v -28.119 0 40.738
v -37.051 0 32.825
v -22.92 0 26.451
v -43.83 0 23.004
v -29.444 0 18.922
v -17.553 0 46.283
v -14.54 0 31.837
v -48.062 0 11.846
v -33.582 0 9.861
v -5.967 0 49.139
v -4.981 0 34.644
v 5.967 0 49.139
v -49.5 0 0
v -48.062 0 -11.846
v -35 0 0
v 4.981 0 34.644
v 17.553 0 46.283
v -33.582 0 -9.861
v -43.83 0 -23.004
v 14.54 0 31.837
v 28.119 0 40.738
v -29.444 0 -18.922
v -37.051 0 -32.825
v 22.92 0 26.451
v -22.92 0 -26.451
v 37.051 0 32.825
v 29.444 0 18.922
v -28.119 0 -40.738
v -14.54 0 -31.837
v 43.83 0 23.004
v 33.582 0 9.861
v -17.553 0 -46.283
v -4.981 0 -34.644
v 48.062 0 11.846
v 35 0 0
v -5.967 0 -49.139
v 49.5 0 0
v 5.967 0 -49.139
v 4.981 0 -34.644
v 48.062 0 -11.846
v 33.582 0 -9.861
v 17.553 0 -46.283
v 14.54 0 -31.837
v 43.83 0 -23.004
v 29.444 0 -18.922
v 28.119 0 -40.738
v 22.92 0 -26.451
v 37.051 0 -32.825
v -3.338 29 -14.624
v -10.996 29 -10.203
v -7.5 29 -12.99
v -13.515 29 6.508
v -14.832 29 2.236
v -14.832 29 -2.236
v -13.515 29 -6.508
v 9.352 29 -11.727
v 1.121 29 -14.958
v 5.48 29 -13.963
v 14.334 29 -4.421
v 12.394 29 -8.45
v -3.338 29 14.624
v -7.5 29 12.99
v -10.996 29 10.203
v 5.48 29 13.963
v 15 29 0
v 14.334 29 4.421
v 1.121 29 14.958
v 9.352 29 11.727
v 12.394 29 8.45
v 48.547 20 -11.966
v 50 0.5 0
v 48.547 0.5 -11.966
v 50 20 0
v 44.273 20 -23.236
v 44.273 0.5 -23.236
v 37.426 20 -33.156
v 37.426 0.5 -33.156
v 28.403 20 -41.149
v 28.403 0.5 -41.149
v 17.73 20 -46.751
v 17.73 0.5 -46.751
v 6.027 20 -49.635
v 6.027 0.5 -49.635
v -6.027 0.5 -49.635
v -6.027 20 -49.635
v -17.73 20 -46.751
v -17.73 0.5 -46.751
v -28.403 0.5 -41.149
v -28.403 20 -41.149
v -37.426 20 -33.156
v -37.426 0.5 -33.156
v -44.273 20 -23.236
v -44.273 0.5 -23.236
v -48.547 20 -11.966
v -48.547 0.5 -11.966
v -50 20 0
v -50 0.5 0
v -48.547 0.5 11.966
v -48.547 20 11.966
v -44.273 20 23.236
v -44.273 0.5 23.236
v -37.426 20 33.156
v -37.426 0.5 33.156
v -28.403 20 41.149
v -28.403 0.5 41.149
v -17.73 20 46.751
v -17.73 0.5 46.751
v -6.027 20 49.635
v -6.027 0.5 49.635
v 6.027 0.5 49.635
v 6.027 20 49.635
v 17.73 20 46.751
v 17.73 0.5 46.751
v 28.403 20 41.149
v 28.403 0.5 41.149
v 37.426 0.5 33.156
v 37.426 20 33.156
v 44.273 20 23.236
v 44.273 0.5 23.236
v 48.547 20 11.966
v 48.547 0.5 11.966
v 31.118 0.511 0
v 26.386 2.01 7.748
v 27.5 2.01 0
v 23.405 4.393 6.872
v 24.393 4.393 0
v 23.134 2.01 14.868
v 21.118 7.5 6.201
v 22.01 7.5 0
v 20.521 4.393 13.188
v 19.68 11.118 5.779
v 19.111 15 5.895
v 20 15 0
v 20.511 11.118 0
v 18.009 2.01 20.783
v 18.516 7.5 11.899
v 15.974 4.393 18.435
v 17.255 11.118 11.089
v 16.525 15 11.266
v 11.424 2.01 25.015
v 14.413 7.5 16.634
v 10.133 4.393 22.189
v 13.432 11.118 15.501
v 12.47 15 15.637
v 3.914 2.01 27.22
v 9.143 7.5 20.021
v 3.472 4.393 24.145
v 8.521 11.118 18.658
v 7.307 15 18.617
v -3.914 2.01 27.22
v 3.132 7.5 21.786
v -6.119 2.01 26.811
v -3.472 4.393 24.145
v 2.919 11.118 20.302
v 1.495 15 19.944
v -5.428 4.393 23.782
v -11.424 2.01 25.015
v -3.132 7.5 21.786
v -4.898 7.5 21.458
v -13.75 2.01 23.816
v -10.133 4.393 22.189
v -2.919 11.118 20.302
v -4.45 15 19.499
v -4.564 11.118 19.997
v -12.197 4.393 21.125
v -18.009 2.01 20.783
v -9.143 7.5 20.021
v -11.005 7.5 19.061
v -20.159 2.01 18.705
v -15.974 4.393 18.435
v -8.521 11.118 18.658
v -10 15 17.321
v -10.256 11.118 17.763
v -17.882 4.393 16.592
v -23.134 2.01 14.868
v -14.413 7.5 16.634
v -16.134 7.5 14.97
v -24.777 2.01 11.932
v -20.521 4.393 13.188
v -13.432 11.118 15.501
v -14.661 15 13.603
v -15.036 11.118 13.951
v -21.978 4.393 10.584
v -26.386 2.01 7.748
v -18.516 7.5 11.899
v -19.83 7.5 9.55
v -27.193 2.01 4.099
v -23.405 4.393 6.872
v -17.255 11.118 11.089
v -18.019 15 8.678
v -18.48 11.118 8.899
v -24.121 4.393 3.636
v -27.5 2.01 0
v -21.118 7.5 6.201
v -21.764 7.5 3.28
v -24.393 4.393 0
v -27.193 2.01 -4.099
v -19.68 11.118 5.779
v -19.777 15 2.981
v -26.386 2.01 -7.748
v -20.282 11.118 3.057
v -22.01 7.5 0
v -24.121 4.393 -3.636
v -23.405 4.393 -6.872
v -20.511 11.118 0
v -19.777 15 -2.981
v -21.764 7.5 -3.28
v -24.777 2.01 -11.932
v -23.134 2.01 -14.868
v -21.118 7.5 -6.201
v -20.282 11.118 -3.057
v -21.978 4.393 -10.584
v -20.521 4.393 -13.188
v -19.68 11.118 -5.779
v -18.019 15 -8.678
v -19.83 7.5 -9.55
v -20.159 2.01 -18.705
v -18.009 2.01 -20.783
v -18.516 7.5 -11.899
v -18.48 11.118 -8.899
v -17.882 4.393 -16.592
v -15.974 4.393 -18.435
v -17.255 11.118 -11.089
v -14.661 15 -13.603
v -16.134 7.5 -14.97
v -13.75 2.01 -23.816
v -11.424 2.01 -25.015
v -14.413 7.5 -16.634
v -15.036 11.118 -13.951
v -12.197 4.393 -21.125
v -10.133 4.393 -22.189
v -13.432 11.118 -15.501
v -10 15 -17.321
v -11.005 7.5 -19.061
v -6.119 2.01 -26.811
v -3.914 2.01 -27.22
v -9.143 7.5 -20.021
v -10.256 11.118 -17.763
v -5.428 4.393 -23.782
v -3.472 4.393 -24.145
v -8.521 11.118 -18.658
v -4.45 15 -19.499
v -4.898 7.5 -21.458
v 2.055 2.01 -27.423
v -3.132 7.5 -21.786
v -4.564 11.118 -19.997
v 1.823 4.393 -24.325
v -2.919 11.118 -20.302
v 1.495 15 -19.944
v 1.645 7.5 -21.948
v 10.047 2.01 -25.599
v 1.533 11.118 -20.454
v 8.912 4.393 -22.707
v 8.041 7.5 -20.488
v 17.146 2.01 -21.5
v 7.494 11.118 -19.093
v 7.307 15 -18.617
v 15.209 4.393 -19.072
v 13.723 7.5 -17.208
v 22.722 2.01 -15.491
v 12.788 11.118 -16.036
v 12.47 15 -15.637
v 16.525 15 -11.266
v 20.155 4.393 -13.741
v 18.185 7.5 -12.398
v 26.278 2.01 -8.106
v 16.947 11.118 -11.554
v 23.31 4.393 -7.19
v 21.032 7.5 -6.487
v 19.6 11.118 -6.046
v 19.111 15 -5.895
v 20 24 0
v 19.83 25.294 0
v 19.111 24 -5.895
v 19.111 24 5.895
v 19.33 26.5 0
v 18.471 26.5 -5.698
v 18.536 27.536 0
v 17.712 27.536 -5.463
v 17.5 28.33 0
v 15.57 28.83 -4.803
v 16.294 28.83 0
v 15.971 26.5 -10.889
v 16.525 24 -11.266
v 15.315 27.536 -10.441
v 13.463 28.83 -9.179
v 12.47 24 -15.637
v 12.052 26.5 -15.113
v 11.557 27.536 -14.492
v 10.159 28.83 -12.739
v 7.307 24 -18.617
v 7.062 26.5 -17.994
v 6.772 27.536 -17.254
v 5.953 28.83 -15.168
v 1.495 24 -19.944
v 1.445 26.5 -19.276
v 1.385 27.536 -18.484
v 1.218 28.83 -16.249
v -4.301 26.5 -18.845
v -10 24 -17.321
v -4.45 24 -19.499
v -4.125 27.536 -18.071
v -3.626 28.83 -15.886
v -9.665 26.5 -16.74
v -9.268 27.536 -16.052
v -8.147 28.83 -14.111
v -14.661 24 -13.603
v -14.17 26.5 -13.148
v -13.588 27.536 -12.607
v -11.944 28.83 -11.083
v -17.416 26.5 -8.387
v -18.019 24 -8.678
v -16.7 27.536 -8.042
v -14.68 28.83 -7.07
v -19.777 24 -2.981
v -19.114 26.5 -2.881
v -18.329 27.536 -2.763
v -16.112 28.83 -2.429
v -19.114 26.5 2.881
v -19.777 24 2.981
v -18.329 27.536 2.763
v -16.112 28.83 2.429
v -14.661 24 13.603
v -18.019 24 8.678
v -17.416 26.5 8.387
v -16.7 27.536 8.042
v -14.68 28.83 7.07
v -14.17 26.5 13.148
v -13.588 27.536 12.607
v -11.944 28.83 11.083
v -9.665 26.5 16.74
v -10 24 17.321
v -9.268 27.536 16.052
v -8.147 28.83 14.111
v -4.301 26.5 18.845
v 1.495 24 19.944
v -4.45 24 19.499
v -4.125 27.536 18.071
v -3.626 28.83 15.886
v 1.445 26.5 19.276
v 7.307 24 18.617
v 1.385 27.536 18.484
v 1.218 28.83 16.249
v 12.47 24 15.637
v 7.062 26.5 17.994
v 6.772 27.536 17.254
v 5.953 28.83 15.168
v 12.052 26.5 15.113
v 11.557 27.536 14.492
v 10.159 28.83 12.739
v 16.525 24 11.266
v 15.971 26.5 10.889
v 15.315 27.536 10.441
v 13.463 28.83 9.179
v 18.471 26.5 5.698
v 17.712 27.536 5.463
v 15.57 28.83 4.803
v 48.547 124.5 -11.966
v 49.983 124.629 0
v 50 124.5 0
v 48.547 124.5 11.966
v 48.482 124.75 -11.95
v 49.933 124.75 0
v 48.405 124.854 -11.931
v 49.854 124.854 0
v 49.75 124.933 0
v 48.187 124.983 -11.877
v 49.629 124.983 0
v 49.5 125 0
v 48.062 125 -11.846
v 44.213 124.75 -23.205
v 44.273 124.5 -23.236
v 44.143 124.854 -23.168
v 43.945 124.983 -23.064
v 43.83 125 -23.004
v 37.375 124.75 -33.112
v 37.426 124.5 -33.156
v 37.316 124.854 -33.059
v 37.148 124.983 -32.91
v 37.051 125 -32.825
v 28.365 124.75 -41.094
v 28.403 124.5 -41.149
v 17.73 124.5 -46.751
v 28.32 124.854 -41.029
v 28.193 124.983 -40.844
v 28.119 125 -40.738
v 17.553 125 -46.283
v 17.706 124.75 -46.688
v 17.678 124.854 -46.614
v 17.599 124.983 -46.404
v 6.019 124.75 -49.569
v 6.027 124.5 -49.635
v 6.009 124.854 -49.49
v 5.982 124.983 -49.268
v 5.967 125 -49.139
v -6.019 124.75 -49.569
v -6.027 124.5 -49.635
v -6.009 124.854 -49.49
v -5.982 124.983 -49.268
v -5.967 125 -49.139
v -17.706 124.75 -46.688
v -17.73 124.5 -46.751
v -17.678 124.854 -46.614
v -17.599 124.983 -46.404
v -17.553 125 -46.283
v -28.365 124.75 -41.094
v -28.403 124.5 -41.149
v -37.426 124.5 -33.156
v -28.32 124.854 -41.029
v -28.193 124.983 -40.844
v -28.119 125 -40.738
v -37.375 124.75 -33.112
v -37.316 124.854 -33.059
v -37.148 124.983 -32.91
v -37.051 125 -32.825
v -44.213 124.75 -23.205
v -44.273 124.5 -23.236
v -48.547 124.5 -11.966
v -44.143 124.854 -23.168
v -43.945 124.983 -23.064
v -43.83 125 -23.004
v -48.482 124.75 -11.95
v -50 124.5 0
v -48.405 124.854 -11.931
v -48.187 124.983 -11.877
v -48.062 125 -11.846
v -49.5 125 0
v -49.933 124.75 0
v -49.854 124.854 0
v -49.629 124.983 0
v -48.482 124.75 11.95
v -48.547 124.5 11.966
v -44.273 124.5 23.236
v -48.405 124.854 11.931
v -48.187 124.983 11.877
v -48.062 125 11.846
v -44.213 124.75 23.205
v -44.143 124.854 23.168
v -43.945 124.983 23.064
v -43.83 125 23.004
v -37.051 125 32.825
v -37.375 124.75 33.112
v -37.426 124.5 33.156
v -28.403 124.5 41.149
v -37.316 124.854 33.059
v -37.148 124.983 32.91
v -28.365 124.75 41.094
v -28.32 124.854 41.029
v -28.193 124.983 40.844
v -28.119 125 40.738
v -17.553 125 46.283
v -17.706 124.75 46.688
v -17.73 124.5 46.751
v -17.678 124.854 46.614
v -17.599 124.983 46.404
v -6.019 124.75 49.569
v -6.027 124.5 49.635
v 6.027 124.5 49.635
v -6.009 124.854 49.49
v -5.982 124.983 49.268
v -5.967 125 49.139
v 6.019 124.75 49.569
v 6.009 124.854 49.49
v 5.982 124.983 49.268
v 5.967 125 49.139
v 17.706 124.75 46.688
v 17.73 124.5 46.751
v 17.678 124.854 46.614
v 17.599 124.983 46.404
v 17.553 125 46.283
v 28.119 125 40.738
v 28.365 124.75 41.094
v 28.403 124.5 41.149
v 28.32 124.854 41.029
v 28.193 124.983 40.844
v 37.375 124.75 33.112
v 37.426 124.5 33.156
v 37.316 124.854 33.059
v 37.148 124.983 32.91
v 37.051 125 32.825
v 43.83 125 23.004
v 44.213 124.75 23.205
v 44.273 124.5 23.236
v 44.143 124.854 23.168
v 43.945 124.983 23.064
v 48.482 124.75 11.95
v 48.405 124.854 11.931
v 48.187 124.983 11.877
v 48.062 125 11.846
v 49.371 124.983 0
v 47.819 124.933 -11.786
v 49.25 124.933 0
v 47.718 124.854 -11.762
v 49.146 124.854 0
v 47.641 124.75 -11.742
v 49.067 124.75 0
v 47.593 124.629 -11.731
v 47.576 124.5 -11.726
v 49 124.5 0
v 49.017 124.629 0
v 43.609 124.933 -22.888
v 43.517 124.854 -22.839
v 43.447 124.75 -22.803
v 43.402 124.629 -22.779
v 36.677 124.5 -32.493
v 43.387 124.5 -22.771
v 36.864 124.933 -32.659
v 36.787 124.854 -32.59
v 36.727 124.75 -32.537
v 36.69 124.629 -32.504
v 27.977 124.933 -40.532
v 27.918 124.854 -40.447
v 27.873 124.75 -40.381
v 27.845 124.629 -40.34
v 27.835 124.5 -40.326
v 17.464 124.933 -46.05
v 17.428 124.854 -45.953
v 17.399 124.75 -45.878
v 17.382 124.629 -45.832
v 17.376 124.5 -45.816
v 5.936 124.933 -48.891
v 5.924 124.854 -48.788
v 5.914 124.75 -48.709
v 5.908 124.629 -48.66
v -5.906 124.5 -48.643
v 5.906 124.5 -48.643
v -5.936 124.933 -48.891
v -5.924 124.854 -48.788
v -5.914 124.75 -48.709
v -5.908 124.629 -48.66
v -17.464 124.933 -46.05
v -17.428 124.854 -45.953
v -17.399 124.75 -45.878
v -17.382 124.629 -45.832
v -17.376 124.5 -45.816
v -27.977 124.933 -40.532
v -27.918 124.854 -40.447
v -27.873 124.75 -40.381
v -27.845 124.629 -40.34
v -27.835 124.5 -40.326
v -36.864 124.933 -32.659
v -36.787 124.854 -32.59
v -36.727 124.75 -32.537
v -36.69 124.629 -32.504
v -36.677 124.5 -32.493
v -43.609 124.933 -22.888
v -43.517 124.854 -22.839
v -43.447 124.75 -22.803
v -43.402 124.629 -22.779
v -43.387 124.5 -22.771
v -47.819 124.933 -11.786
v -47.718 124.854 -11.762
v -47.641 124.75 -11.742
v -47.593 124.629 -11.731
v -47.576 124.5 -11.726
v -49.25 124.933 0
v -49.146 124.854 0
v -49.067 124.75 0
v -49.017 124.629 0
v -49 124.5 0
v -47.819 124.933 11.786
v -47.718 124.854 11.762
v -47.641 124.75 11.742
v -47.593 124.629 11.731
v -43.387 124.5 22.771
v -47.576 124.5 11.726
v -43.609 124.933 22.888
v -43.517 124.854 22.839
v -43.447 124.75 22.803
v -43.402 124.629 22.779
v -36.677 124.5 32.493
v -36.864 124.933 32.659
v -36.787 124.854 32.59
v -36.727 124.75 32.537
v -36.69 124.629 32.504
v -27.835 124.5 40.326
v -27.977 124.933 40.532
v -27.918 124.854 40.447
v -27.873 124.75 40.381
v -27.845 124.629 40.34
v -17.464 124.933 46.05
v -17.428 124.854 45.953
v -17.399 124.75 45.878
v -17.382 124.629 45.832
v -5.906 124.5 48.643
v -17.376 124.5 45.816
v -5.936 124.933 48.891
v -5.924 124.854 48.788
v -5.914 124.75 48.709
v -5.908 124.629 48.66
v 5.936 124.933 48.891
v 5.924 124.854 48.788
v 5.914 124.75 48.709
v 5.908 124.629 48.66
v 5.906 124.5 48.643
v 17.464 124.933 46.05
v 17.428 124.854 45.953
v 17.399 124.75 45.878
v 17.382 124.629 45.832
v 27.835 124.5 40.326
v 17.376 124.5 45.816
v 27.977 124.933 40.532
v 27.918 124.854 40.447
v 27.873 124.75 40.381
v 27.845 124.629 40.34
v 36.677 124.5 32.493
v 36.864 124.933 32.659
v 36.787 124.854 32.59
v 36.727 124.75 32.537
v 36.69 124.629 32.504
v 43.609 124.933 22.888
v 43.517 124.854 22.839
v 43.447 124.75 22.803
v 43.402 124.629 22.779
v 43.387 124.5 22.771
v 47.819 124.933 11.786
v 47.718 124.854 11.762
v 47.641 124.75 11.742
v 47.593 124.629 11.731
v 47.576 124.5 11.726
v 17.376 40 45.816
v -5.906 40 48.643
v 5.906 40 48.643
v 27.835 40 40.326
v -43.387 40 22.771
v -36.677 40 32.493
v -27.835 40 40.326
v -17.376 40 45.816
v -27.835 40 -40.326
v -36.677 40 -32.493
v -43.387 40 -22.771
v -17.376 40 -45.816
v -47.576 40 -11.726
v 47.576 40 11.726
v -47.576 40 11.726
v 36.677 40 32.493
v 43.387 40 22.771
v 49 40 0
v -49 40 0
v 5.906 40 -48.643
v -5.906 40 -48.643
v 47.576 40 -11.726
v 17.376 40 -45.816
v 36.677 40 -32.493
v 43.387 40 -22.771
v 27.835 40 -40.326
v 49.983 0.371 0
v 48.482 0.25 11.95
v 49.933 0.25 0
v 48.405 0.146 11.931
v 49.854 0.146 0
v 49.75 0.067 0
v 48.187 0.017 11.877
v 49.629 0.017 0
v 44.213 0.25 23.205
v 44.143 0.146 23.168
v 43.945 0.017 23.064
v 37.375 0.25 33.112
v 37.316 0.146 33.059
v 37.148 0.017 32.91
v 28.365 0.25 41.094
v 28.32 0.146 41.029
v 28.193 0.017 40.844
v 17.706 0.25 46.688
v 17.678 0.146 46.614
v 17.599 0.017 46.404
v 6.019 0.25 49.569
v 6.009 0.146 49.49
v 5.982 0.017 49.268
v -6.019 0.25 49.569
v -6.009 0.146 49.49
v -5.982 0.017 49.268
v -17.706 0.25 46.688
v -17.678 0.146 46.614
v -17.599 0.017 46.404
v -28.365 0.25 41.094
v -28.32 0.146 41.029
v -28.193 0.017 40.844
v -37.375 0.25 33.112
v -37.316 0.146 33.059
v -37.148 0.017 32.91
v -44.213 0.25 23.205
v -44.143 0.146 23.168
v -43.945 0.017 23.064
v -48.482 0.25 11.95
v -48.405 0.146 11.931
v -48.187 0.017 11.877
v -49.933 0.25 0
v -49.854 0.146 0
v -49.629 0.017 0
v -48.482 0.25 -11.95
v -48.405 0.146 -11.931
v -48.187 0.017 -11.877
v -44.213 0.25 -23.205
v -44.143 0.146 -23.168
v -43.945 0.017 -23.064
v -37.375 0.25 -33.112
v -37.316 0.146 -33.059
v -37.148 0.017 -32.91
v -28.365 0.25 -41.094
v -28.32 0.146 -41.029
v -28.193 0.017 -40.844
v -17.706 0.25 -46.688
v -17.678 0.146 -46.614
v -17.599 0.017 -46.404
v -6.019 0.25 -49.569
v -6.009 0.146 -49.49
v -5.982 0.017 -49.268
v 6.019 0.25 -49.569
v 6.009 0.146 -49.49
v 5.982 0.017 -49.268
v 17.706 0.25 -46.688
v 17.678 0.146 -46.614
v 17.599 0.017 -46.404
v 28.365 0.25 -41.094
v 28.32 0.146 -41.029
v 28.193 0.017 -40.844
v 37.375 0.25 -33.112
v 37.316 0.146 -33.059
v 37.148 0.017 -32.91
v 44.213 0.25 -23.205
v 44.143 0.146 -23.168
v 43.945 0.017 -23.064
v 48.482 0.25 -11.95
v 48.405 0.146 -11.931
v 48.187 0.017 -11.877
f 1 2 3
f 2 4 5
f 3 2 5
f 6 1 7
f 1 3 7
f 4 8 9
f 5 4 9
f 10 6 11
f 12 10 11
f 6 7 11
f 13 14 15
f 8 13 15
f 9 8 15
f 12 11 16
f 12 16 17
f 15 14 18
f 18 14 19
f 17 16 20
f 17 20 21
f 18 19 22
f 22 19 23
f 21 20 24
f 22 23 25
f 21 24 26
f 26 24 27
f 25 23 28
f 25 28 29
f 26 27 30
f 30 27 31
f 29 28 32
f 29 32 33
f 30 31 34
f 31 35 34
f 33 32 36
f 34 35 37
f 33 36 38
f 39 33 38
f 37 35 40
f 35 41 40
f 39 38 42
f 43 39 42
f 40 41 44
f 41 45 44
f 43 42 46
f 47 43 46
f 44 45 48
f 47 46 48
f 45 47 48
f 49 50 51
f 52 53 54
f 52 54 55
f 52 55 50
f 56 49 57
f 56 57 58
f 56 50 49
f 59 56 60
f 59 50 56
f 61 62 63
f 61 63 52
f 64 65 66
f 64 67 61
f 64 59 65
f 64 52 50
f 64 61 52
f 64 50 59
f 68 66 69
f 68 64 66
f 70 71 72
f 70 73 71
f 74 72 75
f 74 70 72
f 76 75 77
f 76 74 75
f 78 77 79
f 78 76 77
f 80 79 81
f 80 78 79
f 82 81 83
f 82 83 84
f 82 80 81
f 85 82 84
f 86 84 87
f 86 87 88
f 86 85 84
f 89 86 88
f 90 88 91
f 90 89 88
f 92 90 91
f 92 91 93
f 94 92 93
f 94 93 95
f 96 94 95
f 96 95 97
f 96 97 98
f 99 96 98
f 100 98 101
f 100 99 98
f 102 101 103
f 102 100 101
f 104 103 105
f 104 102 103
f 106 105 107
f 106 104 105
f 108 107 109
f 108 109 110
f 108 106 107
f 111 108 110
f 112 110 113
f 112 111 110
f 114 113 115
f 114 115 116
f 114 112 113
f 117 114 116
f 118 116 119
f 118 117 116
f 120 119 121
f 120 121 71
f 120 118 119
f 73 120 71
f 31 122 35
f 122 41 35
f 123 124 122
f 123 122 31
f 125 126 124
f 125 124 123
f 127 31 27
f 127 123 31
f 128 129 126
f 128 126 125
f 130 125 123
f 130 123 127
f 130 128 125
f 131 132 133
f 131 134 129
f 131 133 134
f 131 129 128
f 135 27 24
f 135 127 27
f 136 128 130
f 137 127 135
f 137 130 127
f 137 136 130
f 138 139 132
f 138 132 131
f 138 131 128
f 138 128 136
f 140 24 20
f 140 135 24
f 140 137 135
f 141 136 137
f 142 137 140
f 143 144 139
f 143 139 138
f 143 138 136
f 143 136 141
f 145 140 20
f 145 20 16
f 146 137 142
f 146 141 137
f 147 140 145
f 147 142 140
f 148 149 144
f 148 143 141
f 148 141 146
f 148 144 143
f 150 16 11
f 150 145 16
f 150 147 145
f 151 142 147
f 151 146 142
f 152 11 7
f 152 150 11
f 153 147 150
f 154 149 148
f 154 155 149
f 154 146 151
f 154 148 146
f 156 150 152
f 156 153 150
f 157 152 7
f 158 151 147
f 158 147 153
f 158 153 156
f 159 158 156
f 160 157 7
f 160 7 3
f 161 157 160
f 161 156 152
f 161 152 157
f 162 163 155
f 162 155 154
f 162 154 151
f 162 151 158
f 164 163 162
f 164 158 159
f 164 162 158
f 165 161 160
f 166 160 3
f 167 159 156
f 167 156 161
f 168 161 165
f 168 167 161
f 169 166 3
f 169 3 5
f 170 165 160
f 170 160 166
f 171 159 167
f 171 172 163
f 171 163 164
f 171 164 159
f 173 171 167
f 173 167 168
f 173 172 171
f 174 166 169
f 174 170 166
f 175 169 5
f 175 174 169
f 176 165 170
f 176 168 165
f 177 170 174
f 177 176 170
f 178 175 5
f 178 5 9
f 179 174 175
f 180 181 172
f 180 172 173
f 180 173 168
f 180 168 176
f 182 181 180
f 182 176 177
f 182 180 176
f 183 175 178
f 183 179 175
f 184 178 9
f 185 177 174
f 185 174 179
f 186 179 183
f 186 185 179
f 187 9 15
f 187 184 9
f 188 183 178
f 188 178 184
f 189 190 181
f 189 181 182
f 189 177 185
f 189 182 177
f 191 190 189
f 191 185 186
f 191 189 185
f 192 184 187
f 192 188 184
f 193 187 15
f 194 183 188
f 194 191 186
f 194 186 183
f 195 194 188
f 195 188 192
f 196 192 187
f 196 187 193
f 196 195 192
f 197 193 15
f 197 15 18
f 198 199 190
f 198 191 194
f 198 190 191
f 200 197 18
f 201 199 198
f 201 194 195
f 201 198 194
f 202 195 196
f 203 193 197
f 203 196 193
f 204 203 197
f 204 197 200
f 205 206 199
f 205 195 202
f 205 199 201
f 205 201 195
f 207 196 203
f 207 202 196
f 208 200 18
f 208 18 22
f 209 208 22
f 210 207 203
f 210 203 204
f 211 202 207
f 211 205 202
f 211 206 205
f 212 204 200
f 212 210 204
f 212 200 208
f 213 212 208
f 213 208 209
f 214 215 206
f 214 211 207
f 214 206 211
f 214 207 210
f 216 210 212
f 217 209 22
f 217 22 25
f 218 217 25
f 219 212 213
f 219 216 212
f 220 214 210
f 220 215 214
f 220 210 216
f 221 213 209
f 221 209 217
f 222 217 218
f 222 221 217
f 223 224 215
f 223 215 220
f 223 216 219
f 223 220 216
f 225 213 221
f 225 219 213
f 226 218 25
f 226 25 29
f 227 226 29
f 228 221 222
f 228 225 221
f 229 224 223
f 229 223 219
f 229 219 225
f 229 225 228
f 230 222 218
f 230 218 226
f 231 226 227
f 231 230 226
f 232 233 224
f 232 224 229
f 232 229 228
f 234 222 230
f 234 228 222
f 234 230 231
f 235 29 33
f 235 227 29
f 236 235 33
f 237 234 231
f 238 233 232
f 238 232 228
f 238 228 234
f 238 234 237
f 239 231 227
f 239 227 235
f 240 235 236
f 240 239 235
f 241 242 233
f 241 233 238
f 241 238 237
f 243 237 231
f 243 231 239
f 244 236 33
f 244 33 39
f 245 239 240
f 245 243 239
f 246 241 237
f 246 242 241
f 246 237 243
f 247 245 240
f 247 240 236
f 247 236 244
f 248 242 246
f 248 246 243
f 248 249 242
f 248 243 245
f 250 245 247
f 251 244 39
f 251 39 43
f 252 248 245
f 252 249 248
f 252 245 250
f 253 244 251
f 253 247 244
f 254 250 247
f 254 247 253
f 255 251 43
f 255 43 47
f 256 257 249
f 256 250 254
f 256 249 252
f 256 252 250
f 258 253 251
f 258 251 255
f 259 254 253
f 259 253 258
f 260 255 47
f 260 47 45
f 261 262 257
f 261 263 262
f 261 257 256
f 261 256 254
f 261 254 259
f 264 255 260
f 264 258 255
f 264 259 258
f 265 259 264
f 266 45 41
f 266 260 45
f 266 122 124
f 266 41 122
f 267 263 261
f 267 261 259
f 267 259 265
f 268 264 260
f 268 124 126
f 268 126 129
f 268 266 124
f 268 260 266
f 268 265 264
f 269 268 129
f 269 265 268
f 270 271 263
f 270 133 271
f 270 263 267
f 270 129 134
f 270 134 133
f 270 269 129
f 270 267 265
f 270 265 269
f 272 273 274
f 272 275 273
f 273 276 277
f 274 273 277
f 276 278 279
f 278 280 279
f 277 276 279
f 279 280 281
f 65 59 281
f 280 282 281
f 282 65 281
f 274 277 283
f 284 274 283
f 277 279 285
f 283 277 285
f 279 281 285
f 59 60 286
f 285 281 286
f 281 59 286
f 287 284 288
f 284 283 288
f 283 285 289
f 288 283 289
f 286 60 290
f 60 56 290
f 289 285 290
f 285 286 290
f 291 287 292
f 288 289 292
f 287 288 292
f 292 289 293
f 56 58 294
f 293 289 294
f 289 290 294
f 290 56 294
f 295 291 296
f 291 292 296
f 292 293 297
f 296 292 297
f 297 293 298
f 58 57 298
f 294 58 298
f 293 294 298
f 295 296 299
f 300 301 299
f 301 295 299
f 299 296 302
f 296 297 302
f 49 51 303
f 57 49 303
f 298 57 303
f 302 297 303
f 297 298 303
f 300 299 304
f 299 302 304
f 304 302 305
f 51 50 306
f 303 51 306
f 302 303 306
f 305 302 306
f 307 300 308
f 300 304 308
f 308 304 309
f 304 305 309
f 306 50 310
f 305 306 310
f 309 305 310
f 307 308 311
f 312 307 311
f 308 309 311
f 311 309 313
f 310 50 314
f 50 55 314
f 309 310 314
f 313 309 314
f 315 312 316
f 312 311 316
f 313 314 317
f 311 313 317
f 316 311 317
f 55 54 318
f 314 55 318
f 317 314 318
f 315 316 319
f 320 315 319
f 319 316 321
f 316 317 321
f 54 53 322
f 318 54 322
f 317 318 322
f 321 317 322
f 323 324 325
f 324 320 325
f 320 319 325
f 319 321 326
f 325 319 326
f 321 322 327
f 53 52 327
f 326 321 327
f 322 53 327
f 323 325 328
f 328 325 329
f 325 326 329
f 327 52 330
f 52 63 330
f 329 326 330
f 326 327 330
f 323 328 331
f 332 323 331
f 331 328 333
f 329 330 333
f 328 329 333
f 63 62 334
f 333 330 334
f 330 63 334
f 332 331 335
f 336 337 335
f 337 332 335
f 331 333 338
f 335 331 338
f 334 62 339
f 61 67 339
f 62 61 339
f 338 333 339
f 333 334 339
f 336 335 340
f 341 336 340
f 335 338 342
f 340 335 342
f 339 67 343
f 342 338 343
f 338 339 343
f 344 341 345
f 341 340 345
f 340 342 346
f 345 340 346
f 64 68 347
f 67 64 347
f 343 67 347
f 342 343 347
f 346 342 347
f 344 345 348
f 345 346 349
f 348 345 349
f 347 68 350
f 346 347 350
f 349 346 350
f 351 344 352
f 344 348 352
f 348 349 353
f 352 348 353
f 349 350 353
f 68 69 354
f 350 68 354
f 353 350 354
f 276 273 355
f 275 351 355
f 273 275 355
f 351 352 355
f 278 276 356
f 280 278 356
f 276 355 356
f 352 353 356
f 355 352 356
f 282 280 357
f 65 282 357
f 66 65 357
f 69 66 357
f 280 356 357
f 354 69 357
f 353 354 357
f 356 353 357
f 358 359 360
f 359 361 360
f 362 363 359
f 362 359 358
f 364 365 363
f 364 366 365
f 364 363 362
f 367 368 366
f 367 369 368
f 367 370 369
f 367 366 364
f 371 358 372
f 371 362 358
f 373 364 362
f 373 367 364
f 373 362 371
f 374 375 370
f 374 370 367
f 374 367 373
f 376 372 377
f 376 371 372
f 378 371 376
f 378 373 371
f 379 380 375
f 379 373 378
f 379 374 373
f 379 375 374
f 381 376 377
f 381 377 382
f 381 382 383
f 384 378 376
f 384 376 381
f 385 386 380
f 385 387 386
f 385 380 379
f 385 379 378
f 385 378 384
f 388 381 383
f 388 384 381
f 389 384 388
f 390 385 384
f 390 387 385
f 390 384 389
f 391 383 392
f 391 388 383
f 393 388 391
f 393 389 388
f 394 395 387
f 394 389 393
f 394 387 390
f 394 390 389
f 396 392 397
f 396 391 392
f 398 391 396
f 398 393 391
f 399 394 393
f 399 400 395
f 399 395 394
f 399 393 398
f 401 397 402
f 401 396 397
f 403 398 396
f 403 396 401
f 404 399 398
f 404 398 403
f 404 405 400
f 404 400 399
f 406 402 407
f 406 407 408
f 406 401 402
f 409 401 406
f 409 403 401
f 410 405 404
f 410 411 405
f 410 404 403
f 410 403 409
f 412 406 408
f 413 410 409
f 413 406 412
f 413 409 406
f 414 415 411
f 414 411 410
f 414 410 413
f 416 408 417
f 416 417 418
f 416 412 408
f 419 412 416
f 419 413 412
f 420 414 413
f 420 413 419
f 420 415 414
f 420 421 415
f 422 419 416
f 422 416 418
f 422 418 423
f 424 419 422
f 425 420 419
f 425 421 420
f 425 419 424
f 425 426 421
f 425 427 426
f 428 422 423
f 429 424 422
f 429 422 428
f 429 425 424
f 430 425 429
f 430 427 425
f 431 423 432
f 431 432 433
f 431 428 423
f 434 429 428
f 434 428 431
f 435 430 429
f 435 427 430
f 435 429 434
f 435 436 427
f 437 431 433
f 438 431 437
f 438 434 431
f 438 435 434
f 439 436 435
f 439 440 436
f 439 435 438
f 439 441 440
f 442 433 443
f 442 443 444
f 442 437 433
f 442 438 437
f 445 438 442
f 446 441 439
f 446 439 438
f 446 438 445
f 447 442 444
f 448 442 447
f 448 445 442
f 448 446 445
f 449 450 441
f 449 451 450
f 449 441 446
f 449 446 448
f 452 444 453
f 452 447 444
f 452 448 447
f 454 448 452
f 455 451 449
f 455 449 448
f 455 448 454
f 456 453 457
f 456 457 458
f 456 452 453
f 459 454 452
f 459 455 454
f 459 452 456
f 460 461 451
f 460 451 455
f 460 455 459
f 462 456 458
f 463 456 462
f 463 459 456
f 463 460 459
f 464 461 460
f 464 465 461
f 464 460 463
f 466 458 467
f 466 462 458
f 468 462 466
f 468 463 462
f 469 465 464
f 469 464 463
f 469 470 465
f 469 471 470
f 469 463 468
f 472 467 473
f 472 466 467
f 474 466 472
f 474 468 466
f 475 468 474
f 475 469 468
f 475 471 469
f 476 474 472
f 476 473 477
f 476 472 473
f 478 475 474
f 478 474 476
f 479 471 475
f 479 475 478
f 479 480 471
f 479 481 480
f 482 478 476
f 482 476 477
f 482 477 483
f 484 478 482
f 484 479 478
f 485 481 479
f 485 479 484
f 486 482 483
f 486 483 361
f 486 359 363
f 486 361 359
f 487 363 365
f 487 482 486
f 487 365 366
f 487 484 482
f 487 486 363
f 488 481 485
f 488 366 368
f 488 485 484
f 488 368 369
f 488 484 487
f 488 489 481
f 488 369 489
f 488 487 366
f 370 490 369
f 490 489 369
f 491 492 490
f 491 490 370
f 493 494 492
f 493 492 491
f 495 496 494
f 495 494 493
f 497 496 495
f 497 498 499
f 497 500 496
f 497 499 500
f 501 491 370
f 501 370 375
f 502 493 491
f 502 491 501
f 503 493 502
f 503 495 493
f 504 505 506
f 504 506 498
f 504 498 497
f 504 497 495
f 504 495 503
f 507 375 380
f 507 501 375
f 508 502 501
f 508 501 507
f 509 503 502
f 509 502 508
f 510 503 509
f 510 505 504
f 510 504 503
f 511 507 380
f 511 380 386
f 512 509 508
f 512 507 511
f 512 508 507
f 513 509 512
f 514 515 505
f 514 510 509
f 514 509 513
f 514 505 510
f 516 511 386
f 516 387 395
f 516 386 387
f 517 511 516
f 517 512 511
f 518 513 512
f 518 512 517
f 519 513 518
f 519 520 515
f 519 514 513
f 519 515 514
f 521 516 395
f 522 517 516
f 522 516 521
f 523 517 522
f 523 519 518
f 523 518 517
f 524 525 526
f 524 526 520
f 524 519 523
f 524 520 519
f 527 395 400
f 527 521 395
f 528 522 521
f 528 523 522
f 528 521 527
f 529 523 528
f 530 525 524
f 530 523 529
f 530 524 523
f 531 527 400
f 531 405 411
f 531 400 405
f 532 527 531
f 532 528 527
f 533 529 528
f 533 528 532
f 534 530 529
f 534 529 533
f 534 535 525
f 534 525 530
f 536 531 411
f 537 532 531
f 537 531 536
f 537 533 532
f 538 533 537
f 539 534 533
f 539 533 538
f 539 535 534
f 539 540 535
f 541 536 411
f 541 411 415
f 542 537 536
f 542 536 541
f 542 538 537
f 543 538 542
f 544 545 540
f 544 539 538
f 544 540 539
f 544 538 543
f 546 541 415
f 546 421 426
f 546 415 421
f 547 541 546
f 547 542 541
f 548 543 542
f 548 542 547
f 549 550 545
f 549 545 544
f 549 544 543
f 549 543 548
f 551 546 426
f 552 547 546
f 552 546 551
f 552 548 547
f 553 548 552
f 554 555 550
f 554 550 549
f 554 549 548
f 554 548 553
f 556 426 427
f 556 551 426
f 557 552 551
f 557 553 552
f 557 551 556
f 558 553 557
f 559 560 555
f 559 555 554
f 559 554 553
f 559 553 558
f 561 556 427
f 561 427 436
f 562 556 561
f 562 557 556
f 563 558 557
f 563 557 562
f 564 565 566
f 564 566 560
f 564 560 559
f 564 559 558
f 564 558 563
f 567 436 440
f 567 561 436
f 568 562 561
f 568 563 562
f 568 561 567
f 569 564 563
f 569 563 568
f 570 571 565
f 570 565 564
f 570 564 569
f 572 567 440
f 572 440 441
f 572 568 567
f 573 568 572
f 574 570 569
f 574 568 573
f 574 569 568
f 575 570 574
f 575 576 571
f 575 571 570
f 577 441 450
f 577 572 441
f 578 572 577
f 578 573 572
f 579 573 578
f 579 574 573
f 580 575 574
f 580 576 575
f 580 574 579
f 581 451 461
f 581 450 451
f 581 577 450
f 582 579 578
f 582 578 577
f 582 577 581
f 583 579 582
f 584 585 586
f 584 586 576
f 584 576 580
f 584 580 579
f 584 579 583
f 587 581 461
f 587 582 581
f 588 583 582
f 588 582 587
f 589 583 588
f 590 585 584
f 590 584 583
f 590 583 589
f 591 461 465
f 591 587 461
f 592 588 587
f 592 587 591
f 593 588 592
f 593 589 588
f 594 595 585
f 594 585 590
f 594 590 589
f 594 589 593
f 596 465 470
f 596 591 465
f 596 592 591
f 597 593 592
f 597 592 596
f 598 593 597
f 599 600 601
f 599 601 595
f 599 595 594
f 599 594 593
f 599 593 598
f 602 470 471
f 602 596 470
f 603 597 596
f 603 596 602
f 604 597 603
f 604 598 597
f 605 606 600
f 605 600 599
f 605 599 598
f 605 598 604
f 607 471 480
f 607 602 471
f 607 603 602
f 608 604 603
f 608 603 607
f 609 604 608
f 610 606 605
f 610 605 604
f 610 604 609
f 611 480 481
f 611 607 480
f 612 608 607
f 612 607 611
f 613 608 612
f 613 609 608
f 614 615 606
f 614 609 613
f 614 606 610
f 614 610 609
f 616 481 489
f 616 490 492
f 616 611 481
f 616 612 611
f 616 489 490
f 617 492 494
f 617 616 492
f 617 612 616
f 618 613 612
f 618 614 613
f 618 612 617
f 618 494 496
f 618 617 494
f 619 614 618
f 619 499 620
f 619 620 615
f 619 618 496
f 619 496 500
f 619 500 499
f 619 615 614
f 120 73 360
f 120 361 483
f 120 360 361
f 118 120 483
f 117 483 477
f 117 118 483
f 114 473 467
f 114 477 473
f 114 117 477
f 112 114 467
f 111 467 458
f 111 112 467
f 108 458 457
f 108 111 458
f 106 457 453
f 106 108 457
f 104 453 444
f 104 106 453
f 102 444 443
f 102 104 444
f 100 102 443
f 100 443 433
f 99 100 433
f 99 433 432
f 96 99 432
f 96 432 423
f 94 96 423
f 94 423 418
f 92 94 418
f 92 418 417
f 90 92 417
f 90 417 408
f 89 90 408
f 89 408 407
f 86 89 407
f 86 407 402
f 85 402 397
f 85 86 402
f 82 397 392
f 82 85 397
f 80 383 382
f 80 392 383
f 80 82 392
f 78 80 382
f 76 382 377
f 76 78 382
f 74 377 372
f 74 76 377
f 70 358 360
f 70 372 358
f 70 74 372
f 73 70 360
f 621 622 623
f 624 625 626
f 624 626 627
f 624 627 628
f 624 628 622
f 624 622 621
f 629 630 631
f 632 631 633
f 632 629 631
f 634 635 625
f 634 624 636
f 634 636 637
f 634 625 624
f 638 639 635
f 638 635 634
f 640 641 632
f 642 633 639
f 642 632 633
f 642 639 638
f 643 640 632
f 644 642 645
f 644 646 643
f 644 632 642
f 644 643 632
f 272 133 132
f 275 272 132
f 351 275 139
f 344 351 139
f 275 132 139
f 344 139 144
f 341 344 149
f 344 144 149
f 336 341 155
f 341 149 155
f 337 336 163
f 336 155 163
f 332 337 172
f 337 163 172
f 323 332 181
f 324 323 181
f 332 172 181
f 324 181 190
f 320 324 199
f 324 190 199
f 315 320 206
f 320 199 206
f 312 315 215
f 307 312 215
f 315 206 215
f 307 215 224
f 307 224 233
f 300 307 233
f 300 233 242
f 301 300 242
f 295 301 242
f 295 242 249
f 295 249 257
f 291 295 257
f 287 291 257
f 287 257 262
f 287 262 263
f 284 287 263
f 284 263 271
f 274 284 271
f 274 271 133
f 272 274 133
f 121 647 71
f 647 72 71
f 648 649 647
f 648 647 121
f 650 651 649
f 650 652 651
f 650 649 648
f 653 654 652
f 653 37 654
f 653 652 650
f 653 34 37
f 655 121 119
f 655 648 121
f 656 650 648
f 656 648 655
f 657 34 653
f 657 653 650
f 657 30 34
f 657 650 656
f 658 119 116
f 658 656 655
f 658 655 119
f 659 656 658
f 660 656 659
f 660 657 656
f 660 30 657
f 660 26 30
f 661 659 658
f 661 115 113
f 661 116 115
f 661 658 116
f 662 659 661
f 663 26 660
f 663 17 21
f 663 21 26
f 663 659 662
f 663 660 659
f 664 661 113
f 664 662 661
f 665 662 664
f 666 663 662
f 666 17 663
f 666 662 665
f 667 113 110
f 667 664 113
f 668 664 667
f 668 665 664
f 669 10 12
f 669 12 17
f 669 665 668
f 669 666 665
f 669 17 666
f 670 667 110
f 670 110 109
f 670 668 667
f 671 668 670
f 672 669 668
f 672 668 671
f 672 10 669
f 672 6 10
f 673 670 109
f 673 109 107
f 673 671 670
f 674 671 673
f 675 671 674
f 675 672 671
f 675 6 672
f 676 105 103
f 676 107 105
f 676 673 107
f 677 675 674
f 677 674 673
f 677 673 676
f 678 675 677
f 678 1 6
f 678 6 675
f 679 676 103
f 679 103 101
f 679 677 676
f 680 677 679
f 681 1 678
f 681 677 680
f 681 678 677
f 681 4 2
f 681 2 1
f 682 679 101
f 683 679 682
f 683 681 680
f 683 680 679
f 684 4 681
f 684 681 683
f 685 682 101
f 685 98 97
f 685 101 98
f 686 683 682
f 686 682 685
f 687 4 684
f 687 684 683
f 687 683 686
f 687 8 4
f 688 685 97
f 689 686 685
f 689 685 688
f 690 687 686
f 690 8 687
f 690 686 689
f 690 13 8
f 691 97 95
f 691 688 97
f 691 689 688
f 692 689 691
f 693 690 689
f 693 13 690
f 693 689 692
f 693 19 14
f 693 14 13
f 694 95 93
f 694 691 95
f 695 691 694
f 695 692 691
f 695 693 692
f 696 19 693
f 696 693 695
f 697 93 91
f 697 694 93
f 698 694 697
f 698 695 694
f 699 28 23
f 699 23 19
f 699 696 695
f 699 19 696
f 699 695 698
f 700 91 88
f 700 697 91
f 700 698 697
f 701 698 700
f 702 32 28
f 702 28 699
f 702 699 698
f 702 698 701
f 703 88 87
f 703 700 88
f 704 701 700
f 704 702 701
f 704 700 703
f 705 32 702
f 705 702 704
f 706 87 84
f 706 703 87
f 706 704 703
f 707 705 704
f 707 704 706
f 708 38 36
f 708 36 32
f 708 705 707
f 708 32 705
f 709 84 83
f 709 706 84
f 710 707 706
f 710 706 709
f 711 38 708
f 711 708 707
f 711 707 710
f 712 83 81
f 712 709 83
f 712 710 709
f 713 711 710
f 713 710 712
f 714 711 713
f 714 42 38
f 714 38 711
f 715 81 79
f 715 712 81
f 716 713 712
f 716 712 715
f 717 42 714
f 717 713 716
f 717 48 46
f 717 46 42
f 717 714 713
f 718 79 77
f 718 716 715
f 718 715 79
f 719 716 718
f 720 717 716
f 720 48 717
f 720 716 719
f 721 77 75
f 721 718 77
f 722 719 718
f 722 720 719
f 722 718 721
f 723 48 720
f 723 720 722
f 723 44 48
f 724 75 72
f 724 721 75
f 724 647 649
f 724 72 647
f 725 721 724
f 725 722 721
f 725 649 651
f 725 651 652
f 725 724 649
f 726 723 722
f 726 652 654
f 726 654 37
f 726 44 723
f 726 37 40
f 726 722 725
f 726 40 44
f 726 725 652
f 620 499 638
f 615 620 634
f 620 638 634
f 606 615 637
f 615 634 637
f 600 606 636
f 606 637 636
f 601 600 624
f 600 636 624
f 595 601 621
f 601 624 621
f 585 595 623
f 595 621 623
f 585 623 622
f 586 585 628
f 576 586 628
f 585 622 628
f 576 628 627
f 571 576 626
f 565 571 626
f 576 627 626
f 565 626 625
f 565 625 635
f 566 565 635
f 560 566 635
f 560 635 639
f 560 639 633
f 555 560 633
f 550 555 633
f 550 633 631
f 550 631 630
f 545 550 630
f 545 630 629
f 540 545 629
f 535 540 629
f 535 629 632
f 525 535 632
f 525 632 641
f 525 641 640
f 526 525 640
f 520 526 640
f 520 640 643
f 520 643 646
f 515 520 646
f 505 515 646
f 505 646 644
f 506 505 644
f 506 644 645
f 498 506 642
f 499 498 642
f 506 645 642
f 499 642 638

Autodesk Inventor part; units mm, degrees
ref_plane "YZ Plane" through (0, 0, 0) normal (1, 0, 0) x (0, 1, 0)
ref_plane "XZ Plane" through (0, 0, 0) normal (0, 1, 0) x (-1, 0, 0)
ref_plane "XY Plane" through (0, 0, 0) normal (0, 0, 1) x (1, 0, 0)
sketch "Sketch1" plane through (0, 0, 0) normal (0, 0, 1) x (1, 0, 0)
  line L0 (0, 0) -> (50, 0)
  line L1 (50, 0) -> (50, 20)
  line L2 (0, 0) -> (0, 125)
  line L3 (0, 125) -> (50, 125)
  line L4 (50, 125) -> (50, 20)
  dimension "d15" = 125
revolve "Revolution1" add sketch "Sketch1" angle 360 about axis through (0, 0, 0) along (0, 1, 0)
shell "Shell1" thickness 1 removed faces 1 at (-6.8644, 125, 10.9394)
sketch "Sketch2" plane through (0, 1, 0) normal (0, 1, 0) x (1, 0, 0)
  circle A0 centre (0, 0) radius 49 projected
  circle A1 centre (0, 0) radius 49 projected
extrude "Extrusion1" add sketch "Sketch2" along normal blind 39
fillet "Fillet1" radius 0.5 3 edges at (-50, 125, 0) (-49, 125, 0) (-50, 0, 0)
sketch "Sketch3" plane through (0, 0, 0) normal (0, -1, 0) x (1, 0, 0)
  circle A0 centre (0, 0) radius 49.5 projected
  circle A1 centre (0, 0) radius 20
extrude "Extrusion2" cut sketch "Sketch3" against normal blind 29 contours A1
fillet "Fillet2" radius 15 1 edges at (-20, 0, 0)
fillet "Fillet3" radius 5 1 edges at (-20, 29, 0)
properties part number "Visk"
